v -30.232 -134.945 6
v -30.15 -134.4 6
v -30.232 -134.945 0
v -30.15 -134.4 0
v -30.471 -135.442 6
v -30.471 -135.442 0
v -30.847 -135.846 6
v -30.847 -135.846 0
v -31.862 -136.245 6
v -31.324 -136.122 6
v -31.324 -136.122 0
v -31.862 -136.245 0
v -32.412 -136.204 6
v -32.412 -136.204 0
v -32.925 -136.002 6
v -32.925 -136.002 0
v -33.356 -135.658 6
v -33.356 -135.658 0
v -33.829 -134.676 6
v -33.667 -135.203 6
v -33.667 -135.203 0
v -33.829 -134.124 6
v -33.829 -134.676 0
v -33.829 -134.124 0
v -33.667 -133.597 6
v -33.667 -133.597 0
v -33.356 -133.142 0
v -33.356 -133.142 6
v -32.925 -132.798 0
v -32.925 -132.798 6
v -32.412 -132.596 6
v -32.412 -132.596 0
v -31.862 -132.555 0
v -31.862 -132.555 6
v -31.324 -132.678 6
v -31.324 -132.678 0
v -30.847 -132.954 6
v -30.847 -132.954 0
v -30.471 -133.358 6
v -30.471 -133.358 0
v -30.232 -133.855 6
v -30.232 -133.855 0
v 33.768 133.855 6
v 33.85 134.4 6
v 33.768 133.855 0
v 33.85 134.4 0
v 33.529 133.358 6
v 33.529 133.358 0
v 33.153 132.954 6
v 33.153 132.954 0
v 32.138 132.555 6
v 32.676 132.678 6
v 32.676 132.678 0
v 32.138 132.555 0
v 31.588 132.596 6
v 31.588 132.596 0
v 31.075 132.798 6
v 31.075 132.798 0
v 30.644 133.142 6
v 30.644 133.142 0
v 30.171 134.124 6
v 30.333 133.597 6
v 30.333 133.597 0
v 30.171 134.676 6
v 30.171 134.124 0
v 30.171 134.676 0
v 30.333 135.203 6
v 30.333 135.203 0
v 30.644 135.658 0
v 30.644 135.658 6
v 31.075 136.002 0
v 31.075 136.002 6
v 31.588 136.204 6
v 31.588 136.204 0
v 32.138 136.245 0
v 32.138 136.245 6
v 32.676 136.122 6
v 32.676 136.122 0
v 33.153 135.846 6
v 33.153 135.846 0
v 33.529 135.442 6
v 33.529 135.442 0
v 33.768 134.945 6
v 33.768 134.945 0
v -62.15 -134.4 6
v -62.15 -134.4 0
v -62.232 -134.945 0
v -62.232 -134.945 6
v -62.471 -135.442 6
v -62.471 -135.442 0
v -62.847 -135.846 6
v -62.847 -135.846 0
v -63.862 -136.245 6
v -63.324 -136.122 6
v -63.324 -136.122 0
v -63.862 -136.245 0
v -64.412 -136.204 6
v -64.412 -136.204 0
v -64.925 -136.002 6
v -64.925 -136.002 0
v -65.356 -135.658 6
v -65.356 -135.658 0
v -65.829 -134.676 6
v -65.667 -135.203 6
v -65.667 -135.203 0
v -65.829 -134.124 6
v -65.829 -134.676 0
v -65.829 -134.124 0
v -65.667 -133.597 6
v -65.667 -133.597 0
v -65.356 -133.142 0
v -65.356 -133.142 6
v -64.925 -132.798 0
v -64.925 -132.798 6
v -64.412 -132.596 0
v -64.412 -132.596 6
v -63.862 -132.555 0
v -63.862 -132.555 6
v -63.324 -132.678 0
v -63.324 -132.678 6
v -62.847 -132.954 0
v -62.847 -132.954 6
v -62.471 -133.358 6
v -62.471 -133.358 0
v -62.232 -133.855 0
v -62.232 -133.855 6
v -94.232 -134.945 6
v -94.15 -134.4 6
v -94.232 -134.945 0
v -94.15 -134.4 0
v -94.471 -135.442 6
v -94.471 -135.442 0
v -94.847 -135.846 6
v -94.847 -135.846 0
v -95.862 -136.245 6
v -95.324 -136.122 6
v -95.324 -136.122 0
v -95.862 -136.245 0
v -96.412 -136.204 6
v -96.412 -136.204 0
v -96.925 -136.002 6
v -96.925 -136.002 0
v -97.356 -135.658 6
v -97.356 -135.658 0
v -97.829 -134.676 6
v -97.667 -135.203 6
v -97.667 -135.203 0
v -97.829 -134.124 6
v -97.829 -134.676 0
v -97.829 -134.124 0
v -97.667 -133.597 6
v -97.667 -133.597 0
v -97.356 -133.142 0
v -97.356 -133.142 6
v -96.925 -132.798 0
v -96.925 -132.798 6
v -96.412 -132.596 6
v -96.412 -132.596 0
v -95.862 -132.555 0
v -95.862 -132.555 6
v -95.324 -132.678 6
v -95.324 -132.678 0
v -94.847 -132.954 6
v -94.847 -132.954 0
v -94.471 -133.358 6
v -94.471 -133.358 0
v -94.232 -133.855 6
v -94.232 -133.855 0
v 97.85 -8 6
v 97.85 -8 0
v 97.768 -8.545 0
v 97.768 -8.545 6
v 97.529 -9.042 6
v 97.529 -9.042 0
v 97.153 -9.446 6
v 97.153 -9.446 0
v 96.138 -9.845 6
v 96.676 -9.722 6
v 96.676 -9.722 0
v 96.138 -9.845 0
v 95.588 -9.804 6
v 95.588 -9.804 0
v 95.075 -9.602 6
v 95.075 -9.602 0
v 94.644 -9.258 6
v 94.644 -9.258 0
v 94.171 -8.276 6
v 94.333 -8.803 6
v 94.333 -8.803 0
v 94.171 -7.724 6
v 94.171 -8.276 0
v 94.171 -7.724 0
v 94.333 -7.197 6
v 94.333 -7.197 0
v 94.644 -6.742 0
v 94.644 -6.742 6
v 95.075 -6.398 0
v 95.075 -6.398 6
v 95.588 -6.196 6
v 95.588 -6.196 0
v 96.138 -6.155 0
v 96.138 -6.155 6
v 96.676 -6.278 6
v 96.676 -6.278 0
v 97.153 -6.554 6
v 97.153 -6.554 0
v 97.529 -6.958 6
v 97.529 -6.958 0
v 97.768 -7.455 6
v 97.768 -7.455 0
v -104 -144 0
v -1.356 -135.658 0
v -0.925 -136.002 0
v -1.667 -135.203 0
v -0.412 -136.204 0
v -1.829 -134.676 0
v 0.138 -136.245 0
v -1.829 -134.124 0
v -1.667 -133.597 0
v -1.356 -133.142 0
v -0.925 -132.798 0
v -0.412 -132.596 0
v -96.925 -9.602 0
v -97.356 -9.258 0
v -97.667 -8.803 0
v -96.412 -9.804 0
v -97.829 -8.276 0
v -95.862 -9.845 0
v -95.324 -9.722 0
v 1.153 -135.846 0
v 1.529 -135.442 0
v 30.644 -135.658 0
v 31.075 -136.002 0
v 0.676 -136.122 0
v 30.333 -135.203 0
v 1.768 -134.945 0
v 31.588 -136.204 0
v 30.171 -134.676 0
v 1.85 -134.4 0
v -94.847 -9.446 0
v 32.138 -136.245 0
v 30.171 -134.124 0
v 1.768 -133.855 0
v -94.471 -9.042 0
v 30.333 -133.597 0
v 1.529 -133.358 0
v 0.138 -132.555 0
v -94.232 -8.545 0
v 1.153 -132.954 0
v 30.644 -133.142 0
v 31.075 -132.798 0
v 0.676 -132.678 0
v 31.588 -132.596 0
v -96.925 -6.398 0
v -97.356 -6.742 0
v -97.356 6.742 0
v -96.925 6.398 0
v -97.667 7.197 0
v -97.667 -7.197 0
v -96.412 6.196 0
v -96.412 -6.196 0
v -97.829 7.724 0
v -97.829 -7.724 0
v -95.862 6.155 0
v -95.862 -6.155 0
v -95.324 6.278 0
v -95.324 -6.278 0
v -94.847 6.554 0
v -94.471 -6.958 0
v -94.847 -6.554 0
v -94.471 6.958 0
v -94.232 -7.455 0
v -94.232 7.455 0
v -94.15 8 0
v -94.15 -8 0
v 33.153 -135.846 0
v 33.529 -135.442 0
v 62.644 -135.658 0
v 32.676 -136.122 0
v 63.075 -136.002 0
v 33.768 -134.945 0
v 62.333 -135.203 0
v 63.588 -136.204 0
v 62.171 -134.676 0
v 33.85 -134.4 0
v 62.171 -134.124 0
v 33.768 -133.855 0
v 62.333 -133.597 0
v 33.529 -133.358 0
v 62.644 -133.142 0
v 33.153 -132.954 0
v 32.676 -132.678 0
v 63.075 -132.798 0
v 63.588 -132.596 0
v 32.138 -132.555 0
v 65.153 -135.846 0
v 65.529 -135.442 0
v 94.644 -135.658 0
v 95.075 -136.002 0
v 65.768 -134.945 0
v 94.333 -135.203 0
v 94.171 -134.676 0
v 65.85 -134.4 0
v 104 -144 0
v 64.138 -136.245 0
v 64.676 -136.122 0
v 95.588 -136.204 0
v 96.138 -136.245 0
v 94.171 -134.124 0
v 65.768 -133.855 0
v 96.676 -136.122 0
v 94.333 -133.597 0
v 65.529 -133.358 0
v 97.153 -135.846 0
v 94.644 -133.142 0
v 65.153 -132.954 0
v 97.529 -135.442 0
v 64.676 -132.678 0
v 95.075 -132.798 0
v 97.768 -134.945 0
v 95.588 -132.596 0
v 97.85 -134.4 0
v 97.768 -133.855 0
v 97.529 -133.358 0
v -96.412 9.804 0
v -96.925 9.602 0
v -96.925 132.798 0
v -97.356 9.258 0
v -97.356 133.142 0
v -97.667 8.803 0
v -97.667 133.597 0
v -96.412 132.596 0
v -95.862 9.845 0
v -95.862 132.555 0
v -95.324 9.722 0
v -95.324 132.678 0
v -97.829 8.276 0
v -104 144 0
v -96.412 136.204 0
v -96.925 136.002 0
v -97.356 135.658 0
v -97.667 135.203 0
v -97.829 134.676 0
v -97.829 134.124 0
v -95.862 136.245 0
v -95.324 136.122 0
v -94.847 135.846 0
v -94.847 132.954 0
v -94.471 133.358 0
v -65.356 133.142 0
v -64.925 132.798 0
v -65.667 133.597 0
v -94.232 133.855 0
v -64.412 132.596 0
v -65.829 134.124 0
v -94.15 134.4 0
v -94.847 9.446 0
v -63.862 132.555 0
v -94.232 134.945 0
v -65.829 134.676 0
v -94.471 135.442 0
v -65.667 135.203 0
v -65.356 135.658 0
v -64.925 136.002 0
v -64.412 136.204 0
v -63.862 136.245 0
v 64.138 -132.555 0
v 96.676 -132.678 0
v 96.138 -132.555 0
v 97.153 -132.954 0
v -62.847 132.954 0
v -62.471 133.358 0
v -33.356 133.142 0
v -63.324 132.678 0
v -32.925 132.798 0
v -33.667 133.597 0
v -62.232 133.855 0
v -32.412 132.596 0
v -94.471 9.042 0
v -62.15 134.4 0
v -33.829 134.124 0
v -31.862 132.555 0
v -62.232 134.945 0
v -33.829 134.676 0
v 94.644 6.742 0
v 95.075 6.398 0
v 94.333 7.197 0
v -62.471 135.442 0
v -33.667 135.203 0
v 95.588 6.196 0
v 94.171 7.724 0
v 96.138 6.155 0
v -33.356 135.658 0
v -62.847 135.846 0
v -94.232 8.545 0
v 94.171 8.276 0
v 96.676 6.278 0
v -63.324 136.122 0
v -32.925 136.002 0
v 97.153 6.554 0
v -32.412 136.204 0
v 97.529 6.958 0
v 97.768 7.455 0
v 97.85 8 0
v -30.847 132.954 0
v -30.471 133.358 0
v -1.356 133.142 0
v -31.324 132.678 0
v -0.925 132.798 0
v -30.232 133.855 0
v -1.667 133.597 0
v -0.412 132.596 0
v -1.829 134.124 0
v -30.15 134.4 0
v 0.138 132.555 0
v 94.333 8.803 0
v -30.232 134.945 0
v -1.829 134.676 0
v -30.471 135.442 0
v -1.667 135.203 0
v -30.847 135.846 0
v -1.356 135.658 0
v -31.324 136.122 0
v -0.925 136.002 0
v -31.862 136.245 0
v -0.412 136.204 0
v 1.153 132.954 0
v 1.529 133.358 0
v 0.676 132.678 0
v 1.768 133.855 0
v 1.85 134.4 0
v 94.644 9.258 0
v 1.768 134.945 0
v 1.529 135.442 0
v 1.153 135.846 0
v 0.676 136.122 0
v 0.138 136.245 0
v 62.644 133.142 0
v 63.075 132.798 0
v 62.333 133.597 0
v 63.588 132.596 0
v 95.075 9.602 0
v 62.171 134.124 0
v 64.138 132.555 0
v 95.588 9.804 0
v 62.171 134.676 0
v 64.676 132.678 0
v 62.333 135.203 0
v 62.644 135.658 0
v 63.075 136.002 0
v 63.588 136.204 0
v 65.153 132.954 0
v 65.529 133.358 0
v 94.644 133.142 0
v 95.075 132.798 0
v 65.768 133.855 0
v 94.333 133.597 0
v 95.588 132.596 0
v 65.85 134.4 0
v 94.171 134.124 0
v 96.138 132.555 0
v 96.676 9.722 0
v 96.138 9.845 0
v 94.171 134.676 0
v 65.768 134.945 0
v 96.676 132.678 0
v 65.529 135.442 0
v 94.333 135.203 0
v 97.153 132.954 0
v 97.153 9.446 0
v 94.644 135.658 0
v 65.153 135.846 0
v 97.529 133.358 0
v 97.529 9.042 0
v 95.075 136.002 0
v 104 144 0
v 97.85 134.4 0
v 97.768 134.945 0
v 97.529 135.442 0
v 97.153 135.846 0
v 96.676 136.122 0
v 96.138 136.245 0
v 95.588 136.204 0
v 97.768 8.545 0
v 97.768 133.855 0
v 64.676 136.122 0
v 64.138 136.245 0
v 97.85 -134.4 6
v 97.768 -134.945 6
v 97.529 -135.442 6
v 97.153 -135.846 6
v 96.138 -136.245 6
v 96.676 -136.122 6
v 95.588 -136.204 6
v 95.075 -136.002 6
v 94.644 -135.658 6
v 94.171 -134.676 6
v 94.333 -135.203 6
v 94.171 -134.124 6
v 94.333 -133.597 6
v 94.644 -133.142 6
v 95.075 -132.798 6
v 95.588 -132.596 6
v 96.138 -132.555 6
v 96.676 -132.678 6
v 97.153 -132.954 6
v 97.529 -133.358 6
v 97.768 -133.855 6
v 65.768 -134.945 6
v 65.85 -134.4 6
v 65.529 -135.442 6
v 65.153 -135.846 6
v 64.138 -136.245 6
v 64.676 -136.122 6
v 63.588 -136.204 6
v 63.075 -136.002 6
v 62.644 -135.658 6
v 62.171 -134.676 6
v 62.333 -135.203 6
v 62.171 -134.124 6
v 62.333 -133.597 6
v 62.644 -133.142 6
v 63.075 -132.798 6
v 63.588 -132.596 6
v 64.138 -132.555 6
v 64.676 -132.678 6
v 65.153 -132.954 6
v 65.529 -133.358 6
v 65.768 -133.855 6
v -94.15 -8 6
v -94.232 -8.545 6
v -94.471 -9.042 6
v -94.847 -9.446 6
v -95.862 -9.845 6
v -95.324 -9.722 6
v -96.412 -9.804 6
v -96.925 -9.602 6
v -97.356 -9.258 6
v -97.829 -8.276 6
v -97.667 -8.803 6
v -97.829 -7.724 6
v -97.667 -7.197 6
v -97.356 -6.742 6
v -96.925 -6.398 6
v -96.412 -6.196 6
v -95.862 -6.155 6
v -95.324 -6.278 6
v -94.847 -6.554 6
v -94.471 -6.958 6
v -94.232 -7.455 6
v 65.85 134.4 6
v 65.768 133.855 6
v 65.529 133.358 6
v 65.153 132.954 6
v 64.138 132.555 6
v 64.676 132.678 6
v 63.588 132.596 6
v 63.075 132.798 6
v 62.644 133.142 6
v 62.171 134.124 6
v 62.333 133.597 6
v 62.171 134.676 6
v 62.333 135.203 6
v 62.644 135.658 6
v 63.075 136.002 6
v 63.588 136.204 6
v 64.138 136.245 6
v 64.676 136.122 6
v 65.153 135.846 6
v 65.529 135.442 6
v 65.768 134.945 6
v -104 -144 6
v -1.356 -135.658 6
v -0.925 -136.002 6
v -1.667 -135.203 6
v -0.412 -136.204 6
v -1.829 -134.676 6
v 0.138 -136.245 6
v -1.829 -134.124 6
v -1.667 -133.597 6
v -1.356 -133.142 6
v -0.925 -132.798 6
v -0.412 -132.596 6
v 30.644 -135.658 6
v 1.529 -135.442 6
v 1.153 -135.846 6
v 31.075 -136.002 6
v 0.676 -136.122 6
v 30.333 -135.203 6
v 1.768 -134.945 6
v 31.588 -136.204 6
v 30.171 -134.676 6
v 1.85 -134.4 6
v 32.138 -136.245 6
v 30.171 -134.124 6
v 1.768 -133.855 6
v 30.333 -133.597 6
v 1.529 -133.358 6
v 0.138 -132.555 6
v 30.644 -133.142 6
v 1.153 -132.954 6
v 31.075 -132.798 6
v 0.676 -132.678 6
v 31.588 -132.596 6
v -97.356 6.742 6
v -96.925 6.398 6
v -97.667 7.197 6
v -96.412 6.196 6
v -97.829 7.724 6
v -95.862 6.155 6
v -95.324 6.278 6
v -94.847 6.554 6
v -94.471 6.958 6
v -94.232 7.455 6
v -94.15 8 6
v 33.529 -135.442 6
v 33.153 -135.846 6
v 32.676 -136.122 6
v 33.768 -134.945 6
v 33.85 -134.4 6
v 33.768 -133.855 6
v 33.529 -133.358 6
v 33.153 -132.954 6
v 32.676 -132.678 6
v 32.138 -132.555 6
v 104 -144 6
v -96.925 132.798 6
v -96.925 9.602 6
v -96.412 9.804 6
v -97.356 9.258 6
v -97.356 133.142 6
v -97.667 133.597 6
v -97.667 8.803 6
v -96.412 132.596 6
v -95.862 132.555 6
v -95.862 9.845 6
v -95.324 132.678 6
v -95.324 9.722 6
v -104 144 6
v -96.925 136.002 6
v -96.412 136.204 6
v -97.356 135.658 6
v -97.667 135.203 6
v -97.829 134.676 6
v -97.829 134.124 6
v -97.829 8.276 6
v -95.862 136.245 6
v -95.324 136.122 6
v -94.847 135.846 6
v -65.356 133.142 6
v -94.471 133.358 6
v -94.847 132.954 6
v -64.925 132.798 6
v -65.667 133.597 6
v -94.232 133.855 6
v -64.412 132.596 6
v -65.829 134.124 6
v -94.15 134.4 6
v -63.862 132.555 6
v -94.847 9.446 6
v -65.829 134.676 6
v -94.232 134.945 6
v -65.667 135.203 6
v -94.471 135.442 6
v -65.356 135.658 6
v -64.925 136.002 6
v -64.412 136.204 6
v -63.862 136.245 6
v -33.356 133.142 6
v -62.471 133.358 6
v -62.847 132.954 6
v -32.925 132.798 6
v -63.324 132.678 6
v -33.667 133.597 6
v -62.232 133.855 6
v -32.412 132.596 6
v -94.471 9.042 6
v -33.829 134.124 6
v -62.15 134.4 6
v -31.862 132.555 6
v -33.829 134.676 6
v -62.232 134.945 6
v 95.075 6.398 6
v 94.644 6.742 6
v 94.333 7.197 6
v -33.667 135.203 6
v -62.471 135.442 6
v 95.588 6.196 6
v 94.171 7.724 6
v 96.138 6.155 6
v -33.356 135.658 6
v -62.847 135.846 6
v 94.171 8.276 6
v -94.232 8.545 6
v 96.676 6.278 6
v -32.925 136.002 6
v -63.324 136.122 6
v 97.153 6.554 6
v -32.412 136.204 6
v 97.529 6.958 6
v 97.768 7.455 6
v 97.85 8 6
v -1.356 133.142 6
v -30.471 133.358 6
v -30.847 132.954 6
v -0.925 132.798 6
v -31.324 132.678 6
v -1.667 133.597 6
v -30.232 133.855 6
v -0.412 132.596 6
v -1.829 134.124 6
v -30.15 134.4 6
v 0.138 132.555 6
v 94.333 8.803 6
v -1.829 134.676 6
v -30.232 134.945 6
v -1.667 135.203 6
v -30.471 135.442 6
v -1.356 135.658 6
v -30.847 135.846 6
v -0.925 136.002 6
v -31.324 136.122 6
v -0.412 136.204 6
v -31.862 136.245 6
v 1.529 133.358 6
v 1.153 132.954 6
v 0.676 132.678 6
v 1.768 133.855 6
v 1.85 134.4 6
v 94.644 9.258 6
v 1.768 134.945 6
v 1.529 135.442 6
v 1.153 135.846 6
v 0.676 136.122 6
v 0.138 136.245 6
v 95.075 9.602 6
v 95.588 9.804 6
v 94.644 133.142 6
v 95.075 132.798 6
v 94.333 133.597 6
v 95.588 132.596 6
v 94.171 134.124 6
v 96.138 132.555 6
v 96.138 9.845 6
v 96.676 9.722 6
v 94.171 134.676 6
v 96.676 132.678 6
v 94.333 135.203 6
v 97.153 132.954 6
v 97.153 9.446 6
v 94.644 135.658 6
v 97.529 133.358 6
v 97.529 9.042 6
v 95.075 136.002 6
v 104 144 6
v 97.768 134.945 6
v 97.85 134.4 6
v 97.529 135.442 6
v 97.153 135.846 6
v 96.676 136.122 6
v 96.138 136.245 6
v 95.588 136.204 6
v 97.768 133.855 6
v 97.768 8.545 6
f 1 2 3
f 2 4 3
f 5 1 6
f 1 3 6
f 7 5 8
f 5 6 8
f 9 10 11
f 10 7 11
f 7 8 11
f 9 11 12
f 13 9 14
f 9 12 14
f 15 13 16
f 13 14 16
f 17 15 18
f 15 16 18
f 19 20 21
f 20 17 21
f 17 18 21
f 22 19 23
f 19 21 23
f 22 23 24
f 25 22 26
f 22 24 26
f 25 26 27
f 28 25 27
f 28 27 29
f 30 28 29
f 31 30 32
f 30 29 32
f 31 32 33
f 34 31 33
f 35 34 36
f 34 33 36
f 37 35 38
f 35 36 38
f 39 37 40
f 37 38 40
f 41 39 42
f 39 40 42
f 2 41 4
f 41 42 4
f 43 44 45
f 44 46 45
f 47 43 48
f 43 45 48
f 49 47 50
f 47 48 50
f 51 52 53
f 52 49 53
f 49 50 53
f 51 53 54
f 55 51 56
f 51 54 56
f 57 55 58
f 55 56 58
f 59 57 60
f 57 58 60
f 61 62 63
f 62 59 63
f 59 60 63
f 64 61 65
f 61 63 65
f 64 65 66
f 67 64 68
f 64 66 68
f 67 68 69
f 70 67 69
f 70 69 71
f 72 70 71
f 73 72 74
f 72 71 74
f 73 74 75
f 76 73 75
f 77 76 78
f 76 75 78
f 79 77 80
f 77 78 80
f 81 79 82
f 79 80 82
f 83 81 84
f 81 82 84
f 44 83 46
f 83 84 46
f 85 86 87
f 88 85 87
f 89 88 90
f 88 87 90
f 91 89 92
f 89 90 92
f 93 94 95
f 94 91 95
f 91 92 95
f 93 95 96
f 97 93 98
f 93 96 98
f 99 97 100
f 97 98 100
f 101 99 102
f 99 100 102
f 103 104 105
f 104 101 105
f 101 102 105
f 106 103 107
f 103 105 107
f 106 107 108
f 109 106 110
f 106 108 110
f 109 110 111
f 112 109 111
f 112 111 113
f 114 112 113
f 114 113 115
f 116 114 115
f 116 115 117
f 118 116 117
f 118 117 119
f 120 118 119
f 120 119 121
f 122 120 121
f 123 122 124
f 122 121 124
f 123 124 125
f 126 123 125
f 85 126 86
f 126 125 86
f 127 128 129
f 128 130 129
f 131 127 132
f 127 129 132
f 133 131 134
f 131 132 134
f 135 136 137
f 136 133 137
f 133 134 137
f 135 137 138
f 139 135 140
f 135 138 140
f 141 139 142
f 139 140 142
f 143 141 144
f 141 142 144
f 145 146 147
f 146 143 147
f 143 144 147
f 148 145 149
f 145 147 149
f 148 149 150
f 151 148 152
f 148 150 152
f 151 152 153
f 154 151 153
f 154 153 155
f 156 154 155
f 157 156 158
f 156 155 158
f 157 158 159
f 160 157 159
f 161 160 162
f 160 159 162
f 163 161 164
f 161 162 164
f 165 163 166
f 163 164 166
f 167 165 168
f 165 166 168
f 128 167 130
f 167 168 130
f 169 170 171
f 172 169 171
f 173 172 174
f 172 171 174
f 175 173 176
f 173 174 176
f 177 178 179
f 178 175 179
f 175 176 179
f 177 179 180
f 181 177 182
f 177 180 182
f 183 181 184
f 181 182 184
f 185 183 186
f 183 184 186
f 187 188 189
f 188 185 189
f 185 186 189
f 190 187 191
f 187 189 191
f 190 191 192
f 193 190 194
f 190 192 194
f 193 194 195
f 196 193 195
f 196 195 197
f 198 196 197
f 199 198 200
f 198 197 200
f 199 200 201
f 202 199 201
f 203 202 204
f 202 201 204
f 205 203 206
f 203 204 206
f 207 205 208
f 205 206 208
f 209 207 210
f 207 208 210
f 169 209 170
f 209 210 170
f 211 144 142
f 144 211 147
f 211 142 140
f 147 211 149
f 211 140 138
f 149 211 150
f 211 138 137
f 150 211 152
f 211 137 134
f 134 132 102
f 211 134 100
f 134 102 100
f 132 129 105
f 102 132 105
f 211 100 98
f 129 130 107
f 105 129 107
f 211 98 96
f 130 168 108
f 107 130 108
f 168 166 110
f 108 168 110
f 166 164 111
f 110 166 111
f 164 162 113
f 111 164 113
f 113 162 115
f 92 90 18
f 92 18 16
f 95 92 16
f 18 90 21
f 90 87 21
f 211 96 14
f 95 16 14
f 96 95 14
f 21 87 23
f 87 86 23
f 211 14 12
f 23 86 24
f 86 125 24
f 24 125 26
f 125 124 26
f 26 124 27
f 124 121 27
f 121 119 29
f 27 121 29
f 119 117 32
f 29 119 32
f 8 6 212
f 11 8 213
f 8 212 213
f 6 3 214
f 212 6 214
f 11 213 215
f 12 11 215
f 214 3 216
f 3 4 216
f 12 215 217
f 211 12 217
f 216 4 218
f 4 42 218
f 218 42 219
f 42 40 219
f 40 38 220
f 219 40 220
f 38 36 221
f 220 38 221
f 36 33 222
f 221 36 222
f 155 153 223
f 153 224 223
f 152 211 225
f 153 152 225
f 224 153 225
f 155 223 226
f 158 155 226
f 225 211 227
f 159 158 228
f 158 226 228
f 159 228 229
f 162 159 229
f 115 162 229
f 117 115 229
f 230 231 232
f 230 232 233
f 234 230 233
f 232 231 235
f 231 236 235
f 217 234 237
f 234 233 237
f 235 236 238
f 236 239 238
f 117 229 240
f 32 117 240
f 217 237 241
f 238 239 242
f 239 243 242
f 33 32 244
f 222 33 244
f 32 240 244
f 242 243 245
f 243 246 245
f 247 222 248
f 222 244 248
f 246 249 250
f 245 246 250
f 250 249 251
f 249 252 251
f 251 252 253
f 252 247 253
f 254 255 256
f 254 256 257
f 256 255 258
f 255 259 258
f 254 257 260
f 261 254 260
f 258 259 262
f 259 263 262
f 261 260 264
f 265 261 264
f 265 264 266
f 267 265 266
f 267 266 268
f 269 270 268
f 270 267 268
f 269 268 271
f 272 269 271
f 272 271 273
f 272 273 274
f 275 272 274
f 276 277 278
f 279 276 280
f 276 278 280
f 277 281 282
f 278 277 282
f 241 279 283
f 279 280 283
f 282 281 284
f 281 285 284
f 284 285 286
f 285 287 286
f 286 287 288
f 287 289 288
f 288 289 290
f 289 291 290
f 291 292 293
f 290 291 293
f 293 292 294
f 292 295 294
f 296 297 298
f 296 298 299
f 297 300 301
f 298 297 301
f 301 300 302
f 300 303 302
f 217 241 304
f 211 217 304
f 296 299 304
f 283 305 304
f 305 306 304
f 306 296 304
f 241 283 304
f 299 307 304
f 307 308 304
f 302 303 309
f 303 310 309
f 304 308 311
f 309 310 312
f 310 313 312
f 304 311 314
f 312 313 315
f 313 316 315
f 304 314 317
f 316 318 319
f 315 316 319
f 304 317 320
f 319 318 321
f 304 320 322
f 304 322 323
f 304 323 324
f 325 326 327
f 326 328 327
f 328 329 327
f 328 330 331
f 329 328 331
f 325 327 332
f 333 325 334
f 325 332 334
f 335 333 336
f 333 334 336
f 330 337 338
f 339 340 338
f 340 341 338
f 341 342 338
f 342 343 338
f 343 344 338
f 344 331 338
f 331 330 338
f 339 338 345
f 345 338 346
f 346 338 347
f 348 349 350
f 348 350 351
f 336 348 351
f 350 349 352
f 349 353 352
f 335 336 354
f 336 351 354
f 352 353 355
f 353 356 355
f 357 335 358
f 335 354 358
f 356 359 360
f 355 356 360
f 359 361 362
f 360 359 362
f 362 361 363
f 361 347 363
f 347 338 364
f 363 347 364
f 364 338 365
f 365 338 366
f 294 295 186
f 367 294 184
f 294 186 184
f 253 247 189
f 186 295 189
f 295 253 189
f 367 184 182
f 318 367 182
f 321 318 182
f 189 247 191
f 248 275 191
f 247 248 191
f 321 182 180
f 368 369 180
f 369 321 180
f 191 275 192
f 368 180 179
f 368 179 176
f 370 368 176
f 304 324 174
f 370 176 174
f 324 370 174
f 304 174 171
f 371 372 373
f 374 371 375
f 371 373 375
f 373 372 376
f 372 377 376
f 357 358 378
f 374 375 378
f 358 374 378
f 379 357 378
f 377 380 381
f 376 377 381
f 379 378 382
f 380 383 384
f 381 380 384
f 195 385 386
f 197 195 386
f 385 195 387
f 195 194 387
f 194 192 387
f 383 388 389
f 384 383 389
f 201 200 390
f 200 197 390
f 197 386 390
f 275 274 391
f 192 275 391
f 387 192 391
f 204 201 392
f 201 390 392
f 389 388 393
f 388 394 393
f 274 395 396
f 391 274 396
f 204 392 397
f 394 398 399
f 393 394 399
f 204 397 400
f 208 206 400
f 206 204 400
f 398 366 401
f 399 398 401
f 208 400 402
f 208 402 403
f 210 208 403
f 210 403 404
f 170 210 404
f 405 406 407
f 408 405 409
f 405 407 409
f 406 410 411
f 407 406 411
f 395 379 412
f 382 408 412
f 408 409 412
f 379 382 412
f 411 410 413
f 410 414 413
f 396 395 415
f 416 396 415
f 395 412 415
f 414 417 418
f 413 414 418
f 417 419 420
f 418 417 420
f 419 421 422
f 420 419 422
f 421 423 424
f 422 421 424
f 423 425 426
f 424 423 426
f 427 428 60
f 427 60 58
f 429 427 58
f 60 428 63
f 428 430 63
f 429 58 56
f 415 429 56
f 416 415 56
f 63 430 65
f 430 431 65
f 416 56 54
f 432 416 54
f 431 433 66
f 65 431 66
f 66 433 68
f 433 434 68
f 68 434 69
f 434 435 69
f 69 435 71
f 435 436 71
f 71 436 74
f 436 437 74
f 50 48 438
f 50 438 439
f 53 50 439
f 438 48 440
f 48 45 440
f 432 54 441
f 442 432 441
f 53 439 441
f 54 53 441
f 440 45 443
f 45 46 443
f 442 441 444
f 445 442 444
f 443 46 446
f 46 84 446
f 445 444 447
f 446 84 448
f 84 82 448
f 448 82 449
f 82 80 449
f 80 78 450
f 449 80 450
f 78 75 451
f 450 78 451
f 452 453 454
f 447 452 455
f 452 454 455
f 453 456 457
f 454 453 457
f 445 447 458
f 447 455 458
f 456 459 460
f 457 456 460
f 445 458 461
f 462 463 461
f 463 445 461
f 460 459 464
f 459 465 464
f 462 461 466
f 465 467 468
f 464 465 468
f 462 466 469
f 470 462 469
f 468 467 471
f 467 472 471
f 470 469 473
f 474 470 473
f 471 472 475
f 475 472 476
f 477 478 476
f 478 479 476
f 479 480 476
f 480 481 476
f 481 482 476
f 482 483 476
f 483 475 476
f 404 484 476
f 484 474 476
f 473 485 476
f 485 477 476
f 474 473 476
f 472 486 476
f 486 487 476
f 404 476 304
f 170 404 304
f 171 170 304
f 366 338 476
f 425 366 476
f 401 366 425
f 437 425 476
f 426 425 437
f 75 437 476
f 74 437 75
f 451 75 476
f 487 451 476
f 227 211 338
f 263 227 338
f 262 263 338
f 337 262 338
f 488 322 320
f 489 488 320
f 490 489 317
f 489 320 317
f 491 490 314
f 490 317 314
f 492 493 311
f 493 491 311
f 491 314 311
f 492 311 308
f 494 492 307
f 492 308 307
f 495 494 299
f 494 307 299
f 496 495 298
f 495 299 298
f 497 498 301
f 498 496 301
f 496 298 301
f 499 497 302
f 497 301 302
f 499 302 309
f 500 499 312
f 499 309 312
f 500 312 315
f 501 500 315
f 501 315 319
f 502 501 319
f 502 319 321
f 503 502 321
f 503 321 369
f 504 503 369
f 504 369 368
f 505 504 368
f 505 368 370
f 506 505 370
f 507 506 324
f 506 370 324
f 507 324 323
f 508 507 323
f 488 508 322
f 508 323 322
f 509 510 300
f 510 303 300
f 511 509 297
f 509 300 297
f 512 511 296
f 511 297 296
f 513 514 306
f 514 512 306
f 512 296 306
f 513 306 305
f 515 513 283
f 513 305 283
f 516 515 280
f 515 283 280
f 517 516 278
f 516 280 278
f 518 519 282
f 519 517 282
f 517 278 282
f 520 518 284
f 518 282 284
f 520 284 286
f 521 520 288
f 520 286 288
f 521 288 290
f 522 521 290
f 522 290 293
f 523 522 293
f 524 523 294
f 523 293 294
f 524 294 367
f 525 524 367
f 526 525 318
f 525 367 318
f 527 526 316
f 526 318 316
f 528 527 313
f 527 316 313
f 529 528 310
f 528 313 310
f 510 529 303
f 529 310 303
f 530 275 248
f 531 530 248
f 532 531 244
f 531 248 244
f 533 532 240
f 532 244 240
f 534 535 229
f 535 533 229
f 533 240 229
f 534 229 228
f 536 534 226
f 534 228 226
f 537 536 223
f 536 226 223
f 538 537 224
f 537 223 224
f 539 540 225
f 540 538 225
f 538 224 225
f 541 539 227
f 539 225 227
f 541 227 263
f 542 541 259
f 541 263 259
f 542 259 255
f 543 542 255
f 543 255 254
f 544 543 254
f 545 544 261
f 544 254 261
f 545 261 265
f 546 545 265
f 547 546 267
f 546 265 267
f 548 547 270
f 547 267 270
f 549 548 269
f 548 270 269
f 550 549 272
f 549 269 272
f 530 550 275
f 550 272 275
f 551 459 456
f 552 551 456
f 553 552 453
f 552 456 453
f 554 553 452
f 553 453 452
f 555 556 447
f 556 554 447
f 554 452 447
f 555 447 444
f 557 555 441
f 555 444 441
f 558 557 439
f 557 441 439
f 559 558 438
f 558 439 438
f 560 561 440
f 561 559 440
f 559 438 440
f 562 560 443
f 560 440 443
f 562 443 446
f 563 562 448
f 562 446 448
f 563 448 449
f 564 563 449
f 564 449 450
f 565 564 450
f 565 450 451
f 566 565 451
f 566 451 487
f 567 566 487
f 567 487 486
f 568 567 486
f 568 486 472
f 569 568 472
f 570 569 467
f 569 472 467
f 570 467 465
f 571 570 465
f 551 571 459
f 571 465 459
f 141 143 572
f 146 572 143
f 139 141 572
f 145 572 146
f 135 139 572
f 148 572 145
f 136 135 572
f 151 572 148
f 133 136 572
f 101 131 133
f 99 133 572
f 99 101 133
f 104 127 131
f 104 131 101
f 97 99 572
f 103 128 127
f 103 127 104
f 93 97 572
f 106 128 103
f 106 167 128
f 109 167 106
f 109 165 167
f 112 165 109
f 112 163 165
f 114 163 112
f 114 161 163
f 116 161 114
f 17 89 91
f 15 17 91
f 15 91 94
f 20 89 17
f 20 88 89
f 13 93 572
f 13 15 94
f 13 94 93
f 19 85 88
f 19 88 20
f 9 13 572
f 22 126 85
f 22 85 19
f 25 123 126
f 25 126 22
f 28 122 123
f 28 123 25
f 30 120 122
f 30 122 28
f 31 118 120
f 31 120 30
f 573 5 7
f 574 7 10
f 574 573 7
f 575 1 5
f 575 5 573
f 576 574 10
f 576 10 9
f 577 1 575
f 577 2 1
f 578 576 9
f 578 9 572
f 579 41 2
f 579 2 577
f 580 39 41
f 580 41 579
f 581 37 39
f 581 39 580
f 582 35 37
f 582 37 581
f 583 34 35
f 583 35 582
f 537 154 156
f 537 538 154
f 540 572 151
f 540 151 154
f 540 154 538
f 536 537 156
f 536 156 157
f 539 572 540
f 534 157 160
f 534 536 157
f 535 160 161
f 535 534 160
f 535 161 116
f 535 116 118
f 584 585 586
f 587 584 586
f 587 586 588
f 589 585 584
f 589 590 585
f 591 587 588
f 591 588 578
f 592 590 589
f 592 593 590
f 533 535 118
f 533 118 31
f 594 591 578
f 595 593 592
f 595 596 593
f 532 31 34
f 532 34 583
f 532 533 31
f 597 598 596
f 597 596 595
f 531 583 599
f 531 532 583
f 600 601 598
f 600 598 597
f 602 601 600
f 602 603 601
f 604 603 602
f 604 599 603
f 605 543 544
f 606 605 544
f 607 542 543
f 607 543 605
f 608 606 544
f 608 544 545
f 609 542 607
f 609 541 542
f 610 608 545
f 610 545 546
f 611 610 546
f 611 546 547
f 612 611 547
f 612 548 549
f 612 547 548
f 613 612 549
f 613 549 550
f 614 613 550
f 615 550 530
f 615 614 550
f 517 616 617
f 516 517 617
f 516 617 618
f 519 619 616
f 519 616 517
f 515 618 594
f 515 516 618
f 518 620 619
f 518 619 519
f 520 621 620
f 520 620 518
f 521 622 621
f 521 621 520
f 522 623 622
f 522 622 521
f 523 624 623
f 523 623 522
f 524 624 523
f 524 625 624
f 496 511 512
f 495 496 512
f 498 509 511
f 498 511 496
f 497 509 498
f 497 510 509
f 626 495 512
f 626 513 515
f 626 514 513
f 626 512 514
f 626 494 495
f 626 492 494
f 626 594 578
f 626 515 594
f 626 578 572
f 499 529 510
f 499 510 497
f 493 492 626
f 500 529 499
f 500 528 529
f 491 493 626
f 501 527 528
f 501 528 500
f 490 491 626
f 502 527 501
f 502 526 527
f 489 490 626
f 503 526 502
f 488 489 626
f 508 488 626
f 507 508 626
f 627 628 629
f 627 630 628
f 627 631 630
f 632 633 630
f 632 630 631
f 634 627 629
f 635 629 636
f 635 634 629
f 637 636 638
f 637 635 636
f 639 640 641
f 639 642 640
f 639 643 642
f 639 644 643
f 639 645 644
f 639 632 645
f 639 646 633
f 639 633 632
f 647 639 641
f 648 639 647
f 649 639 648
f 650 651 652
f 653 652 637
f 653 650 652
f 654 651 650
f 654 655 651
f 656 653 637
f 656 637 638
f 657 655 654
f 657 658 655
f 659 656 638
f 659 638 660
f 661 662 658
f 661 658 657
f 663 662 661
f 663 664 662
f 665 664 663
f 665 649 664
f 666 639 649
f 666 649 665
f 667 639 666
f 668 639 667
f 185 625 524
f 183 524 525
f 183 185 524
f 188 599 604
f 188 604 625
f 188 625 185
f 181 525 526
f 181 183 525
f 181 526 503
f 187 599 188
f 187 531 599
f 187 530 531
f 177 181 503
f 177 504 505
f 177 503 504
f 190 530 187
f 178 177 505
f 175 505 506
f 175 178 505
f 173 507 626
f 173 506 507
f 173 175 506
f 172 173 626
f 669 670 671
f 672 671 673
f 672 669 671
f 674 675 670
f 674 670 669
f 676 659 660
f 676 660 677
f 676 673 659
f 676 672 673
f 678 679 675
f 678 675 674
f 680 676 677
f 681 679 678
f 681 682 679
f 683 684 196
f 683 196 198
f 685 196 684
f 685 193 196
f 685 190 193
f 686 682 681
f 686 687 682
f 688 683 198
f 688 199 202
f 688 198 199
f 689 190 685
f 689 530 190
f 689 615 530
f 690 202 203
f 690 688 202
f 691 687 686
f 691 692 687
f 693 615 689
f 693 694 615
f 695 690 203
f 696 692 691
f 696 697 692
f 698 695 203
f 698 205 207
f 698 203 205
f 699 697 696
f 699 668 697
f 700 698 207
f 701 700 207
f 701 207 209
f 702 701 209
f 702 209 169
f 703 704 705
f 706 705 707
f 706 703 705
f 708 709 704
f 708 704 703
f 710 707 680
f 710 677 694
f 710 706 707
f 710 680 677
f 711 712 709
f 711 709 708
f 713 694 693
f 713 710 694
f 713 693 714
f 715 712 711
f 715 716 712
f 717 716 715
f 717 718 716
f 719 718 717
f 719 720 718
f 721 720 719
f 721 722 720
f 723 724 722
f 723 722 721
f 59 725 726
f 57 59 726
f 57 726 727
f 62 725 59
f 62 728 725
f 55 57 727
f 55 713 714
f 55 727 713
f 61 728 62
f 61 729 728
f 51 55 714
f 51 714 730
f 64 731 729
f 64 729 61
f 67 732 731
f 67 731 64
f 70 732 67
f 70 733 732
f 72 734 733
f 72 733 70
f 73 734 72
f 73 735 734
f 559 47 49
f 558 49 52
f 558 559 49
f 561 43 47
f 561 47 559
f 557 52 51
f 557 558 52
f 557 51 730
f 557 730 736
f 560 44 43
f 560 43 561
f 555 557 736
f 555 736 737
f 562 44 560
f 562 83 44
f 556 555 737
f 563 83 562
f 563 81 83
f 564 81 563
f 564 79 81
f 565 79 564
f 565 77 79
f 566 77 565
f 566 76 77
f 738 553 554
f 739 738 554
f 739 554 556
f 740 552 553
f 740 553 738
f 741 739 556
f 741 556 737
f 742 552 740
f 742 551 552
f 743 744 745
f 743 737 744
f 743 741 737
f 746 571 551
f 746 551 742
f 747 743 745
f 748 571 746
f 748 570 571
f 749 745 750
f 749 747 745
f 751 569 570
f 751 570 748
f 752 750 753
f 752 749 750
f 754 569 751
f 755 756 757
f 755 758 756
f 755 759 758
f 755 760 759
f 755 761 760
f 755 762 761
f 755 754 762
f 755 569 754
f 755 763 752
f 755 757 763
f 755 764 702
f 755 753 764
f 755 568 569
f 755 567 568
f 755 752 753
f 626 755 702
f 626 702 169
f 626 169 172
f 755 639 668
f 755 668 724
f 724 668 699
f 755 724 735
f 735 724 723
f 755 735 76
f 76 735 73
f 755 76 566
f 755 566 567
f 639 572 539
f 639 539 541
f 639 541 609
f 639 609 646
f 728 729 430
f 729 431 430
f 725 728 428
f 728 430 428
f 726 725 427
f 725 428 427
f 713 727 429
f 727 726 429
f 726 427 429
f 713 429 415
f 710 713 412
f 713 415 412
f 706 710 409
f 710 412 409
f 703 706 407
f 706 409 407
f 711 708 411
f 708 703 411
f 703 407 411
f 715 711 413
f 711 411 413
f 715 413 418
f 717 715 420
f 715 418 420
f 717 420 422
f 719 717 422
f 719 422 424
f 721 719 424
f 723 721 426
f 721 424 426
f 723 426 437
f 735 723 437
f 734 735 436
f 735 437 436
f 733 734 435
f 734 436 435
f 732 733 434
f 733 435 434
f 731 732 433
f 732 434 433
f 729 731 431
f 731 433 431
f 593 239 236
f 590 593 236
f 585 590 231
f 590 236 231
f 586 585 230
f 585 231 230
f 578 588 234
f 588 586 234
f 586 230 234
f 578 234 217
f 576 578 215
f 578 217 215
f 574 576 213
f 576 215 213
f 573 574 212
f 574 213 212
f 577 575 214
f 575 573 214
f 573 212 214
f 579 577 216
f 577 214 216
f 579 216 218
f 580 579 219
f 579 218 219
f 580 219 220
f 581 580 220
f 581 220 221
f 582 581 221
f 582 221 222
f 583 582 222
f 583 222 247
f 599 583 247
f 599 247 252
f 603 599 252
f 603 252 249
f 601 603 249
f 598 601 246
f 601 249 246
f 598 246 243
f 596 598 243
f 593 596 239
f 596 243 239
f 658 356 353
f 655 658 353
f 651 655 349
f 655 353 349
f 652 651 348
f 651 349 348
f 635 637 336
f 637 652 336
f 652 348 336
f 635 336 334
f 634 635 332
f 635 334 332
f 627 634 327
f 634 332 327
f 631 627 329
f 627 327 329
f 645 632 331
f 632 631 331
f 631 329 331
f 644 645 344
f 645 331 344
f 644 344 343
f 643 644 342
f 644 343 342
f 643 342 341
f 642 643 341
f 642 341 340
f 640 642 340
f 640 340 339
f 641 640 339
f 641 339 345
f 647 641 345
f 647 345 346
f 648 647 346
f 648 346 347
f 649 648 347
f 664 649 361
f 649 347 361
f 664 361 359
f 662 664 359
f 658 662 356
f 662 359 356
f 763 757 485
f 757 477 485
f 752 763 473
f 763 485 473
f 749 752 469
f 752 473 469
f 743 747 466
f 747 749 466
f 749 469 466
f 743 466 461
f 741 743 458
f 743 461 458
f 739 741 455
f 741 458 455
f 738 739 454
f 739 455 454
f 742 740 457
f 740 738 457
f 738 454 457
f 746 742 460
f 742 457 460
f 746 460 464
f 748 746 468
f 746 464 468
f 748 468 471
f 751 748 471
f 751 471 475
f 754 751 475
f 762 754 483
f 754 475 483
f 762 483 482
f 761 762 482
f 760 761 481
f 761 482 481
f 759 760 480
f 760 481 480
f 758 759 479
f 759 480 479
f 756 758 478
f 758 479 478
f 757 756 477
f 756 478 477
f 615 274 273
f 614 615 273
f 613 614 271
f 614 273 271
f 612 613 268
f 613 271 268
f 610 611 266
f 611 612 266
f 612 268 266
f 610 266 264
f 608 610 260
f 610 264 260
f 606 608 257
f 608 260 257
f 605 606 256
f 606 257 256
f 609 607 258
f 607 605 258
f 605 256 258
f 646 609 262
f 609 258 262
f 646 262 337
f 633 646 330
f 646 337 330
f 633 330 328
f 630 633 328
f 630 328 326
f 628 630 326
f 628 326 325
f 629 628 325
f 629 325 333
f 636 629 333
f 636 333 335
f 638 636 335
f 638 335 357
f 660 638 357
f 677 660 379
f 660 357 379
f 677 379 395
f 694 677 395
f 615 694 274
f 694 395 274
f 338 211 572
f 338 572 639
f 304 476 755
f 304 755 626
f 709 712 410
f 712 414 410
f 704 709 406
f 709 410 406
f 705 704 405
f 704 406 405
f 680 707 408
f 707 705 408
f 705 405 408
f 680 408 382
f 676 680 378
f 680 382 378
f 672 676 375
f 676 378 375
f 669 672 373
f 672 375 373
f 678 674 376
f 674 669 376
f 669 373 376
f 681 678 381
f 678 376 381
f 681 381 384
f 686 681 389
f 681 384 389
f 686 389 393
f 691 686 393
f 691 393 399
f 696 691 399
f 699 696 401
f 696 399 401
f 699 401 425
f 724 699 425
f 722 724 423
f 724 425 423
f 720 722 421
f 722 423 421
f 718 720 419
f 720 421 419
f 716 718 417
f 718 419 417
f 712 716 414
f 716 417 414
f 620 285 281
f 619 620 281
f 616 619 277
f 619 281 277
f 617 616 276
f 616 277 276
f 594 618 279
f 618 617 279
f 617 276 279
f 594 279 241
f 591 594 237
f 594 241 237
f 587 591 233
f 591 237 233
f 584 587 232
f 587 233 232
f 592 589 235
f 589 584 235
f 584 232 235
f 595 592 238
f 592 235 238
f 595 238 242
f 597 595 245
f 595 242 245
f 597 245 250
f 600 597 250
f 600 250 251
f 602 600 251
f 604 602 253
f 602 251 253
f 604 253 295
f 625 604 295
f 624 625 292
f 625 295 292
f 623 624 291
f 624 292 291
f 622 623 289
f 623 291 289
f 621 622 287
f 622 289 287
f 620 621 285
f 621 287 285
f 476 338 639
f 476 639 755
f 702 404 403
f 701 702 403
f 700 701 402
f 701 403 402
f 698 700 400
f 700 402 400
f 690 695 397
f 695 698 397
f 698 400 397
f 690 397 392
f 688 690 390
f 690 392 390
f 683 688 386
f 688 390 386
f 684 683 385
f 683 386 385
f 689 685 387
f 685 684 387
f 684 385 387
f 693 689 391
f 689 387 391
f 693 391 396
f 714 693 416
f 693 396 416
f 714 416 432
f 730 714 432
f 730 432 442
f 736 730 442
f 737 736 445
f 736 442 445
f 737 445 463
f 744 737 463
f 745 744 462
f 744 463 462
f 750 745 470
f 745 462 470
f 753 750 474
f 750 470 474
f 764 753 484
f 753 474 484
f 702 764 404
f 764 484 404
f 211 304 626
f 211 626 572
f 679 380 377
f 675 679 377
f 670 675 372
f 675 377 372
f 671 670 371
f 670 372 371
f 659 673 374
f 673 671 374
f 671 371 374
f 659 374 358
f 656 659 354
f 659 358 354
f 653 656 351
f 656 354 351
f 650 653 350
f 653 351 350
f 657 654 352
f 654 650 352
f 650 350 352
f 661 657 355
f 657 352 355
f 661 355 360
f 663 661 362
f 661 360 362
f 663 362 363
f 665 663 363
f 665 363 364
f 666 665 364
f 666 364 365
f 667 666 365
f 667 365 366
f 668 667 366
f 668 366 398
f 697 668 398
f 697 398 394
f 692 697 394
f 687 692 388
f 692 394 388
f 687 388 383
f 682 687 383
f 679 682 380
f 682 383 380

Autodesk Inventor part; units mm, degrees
ref_plane "YZ Plane" through (0, 0, 0) normal (1, 0, 0) x (0, 1, 0)
ref_plane "XZ Plane" through (0, 0, 0) normal (0, 1, 0) x (-1, 0, 0)
ref_plane "XY Plane" through (0, 0, 0) normal (0, 0, 1) x (1, 0, 0)
sketch "Sketch1" plane through (0, 0, 0) normal (0, 0, 1) x (1, 0, 0)
  line L0 (104, -144) -> (-104, -144)
  line L1 (-104, -144) -> (-104, 144)
  line L2 (-104, 144) -> (104, 144)
  line L3 (104, 144) -> (104, -144)
  line L4 (104, -144) -> (-104, 144) construction
  line L5 (-104, -144) -> (104, 144) construction
  circle A0 centre (96, 134.4) radius 1.85
  circle A1 centre (64, 134.4) radius 1.85
  circle A2 centre (32, 134.4) radius 1.85
  circle A3 centre (0, 134.4) radius 1.85
  circle A4 centre (-32, 134.4) radius 1.85
  circle A5 centre (-64, 134.4) radius 1.85
  circle A6 centre (-96, 134.4) radius 1.85
  circle A7 centre (64, -134.4) radius 1.85
  circle A8 centre (32, -134.4) radius 1.85
  circle A9 centre (96, -134.4) radius 1.85
  circle A10 centre (0, -134.4) radius 1.85
  circle A11 centre (-32, -134.4) radius 1.85
  circle A12 centre (-96, -134.4) radius 1.85
  line L6 (104, 144) -> (-104, -144) construction
  line L7 (-104, 144) -> (104, -144) construction
  circle A13 centre (-64, -134.4) radius 1.85
  circle A14 centre (-96, 8) radius 1.85 projected
  circle A15 centre (-96, -8) radius 1.85 projected
  circle A16 centre (96, 8) radius 1.85 projected
  circle A17 centre (96, -8) radius 1.85 projected
  dimension "d0" = 208
  dimension "d1" = 288
  dimension "d13" = 3.7
  dimension "d14" = 32
  dimension "d15" = 32
  dimension "d16" = 9.6
  dimension "d17" = 8
  dimension "d18" = 8
  dimension "d19" = 9.6
  dimension "d20" = 8
  dimension "d21" = 9.6
  dimension "d22" = 9.6
  dimension "d23" = 8
  dimension "d24" = 16
  dimension "d25" = 8
  dimension "d26" = 16
  dimension "d27" = 8
  dimension "d28" = 32
  dimension "d29" = 32
  dimension "d30" = 32
  dimension "d31" = 32
  dimension "d32" = 32
  dimension "d33" = 32
  dimension "d34" = 32
  dimension "d35" = 32
  dimension "d36" = 32
  dimension "d37" = 32
extrude "Extrusion5" add sketch "Sketch1" along normal blind 6
properties part number "KrackenPlatedimensions"
